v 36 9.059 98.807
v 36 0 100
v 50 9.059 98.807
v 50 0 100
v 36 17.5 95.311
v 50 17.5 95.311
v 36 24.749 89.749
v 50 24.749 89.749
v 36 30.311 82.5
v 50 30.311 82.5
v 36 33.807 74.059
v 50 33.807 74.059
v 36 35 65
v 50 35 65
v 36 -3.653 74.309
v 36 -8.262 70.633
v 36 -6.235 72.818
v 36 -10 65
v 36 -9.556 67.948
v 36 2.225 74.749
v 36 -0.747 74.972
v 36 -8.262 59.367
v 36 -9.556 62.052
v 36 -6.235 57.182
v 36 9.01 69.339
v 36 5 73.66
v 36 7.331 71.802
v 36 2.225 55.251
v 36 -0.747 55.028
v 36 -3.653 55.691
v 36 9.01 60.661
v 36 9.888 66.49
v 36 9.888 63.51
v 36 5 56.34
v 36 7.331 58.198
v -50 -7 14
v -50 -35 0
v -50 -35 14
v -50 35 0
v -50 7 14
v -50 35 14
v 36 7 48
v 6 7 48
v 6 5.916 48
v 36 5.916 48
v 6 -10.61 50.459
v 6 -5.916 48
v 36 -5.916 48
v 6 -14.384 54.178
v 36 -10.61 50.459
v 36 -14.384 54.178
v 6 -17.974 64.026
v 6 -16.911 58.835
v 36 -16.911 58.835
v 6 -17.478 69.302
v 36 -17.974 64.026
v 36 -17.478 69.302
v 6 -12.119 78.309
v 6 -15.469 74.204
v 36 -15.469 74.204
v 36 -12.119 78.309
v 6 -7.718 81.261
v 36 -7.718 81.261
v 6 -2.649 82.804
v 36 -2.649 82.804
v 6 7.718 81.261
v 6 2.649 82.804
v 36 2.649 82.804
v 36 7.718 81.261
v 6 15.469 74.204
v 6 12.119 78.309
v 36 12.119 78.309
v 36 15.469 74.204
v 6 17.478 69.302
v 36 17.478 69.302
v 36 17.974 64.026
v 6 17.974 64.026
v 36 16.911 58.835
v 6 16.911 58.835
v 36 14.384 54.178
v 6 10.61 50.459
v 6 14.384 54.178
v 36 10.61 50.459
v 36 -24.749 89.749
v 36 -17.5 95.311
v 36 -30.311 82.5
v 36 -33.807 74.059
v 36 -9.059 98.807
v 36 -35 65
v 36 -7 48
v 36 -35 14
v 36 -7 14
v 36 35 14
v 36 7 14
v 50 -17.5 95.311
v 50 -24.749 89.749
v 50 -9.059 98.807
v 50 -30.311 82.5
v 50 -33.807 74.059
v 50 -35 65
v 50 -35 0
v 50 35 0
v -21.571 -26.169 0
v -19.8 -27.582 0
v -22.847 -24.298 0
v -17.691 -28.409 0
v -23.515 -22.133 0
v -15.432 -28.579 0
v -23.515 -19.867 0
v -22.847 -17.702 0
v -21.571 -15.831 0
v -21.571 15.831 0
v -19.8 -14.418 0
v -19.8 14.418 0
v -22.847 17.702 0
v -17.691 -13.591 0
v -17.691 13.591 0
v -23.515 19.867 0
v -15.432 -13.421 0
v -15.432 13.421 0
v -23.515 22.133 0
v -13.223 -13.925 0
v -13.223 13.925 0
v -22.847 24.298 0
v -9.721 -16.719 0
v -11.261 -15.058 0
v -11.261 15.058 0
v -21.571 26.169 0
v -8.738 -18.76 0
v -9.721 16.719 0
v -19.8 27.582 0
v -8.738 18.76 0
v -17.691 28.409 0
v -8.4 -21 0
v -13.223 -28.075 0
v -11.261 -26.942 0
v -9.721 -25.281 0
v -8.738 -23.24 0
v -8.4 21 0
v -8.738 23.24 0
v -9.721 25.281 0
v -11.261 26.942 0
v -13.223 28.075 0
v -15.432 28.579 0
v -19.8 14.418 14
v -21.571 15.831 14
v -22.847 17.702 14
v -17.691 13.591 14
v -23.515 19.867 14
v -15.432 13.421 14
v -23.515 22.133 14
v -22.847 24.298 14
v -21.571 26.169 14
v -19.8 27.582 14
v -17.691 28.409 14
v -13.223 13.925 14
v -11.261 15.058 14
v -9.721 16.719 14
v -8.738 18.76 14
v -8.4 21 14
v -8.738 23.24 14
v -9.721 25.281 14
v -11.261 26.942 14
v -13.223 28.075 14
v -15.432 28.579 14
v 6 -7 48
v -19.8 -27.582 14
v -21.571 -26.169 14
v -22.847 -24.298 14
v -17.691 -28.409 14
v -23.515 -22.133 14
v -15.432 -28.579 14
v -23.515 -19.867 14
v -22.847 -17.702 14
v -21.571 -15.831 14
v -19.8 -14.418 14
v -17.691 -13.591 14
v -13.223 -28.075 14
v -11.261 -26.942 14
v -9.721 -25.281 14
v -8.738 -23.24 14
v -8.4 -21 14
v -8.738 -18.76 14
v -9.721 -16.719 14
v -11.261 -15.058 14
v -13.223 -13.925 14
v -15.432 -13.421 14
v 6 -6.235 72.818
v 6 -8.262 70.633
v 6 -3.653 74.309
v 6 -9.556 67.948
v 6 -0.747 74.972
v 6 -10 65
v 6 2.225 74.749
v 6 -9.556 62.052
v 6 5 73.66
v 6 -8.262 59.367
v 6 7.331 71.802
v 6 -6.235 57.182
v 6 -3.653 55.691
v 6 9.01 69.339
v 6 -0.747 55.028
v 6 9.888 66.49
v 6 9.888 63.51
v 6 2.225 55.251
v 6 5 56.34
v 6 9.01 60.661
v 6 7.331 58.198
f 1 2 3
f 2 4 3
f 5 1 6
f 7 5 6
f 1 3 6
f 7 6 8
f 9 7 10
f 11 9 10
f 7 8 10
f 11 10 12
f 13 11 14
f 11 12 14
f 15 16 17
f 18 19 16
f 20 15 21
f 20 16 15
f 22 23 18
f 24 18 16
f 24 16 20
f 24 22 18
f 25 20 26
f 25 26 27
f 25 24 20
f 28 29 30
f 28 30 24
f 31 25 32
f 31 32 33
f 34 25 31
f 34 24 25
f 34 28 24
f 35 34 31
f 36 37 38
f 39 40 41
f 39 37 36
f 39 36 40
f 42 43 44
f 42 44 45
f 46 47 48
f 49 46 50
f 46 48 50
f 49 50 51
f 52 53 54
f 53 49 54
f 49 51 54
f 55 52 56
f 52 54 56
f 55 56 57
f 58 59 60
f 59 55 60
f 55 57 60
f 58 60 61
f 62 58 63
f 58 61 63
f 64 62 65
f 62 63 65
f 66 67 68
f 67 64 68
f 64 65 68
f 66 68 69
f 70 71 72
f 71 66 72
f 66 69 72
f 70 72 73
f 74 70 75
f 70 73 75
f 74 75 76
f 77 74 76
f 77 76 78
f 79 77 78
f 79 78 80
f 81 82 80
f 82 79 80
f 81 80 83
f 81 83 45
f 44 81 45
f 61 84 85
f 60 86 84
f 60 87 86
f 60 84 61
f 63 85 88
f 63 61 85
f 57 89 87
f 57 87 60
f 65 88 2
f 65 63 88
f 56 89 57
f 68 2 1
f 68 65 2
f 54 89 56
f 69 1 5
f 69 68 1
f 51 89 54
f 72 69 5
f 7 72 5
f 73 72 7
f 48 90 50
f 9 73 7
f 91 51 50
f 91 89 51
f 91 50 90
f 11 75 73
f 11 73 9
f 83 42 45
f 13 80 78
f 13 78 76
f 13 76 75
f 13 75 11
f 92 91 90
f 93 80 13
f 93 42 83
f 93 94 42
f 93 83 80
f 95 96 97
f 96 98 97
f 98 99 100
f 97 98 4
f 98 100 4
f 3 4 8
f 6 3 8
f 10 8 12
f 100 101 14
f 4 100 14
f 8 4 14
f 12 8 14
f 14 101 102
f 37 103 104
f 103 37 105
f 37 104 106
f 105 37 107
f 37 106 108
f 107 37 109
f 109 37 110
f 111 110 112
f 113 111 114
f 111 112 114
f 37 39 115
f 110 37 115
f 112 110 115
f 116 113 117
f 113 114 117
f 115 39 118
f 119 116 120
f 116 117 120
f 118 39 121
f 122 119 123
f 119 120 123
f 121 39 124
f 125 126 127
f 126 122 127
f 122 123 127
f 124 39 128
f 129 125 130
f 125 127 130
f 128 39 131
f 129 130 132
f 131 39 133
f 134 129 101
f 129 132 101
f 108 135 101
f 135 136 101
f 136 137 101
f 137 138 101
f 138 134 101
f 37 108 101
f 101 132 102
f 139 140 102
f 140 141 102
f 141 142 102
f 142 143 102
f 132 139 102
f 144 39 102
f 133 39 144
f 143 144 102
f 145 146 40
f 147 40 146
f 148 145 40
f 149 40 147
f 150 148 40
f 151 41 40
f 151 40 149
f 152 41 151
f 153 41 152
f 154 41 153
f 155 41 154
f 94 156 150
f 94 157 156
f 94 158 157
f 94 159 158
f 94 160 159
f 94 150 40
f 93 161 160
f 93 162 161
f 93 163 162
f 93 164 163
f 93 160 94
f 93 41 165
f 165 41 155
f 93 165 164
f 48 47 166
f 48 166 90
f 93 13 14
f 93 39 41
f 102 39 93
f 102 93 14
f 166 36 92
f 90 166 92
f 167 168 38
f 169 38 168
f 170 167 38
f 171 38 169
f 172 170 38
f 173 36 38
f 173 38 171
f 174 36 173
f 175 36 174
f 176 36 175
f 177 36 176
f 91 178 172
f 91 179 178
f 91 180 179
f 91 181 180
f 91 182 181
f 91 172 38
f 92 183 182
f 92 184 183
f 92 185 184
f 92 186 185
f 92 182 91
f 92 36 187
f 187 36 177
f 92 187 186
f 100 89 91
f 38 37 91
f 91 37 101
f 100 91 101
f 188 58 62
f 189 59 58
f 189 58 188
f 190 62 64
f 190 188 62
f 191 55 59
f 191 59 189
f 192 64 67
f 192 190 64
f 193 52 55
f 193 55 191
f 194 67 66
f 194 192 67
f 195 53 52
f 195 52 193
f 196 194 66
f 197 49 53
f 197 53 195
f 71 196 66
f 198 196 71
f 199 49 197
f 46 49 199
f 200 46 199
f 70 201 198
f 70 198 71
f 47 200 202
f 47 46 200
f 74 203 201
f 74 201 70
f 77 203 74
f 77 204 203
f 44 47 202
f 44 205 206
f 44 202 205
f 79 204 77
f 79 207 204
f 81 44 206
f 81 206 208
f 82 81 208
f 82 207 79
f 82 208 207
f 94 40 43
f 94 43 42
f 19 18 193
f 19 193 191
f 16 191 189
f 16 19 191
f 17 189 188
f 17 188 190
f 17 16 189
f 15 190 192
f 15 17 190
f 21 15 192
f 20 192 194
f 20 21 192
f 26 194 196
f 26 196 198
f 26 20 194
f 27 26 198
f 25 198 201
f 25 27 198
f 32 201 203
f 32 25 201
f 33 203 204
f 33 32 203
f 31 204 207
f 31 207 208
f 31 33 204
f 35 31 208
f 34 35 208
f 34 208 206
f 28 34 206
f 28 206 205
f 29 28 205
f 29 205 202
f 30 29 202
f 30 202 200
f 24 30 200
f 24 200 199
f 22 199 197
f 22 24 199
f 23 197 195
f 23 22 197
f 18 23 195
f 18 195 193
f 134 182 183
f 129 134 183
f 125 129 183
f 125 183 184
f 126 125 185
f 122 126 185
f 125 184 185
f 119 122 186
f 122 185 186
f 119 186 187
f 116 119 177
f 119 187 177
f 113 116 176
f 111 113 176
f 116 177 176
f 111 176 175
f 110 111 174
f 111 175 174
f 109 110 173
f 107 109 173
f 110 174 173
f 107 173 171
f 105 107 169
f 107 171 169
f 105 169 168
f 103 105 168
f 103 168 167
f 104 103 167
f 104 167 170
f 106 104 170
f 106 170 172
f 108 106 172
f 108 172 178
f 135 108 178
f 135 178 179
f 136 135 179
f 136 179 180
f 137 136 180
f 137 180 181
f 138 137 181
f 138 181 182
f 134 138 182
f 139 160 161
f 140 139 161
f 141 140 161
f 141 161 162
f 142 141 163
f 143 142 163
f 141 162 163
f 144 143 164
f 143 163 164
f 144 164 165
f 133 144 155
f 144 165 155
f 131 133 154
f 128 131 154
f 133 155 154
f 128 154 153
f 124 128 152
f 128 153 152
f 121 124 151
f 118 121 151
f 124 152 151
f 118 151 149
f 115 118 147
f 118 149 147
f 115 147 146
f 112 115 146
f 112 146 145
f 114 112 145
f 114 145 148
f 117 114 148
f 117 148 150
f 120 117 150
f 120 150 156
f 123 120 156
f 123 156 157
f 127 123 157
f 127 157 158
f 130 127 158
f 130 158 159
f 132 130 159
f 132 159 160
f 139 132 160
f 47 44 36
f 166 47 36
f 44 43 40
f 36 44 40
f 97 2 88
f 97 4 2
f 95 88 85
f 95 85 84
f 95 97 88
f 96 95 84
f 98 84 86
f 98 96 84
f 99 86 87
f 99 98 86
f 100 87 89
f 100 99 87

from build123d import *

# Parameters (mm, degrees)
SKETCH_1_W                     = 100
SKETCH_1_H                     = 70
EXTRUDE_1_DEPTH                = 14
SKETCH_4_W                     = 14
SKETCH_4_H                     = 70
EXTRUDE_2_DEPTH                = 86
FILLET_1_R                     = 35
FILLET_2_R                     = 35
SKETCH_5_R                     = 7.6
CUT_EXTRUDE_1_DEPTH            = 106.456152025
SKETCH_6_R                     = 7.6
CUT_EXTRUDE_2_DEPTH            = 106.456152025
SKETCH_7_R                     = 18
SKETCH_7_R_2                   = 10
EXTRUDE_3_DEPTH                = 30
SKETCH_8_W                     = 100
SKETCH_8_H                     = 14
EXTRUDE_4_DEPTH                = 34
SPLIT_BODIES_1_SURFACE_1_BACK  = 158.797
SPLIT_BODIES_1_SURFACE_1_DEPTH = 317.594


with BuildPart() as part:
    # Эскиз1 → Бобышка-Вытянуть1 (new body)
    with BuildSketch(Plane.XY):
        Rectangle(SKETCH_1_W, SKETCH_1_H)
    extrude(amount=EXTRUDE_1_DEPTH)

    # Эскиз4 → Бобышка-Вытянуть2 (add)
    with BuildSketch(Plane.XY.offset(14)):
        with Locations((43, 0)):
            Rectangle(SKETCH_4_W, SKETCH_4_H)
    extrude(amount=EXTRUDE_2_DEPTH)

    # Скругление1
    fillet_1_edges = [part.edges().sort_by_distance(p)[0] for p in [
        (43, 35, 100),
    ]]
    fillet(fillet_1_edges, radius=FILLET_1_R)

    # Скругление2
    fillet_2_edges = [part.edges().sort_by_distance(p)[0] for p in [
        (43, -35, 100),
    ]]
    fillet(fillet_2_edges, radius=FILLET_2_R - 0.0001)  # a hair under: the kernel refuses the full size

    # Эскиз5 → Вырез-Вытянуть1 (cut, through all)
    with BuildSketch(Plane.XY.offset(14)):
        with Locations((-16, 21)):
            Circle(SKETCH_5_R)
    extrude(amount=-CUT_EXTRUDE_1_DEPTH, mode=Mode.SUBTRACT)

    # Эскиз6 → Вырез-Вытянуть2 (cut, through all)
    with BuildSketch(Plane.XY.offset(14)):
        with Locations((-16, -21)):
            Circle(SKETCH_6_R)
    extrude(amount=-CUT_EXTRUDE_2_DEPTH, mode=Mode.SUBTRACT)

    # Эскиз7 → Бобышка-Вытянуть3 (add)
    with BuildSketch(Plane.ZY.offset(-36)):
        with Locations(Location((65, 0, 0), (0, 0, 90))):
            Circle(SKETCH_7_R)
        with Locations(Location((65, 0, 0), (0, 0, 270))):
            Circle(SKETCH_7_R_2, mode=Mode.SUBTRACT)
    extrude(amount=EXTRUDE_3_DEPTH)

    # Эскиз8 → Бобышка-Вытянуть4 (add)
    with BuildSketch(Plane.XY.offset(14)):
        Rectangle(SKETCH_8_W, SKETCH_8_H)
    extrude(amount=EXTRUDE_4_DEPTH)

    # Split Bodies 1: cut with a surface, the side it looks to stays
    # Split Bodies 1 surface: a surface, the sketch's curves swept straight by 317.594 mm
    with BuildLine(Plane(origin=(0, -7, 0), x_dir=(-1, 0, 0), z_dir=(0, -1, 0)).offset(-SPLIT_BODIES_1_SURFACE_1_BACK), mode=Mode.PRIVATE) as split_bodies_1_surface_1_path:
        Line((-6, -48), (50, -14))
    split_bodies_1_surface_1 = Shell.extrude(split_bodies_1_surface_1_path.wire(), (0 * SPLIT_BODIES_1_SURFACE_1_DEPTH, -1 * SPLIT_BODIES_1_SURFACE_1_DEPTH, 0 * SPLIT_BODIES_1_SURFACE_1_DEPTH))
    split(bisect_by=split_bodies_1_surface_1, keep=Keep.TOP)


solid = part.part
